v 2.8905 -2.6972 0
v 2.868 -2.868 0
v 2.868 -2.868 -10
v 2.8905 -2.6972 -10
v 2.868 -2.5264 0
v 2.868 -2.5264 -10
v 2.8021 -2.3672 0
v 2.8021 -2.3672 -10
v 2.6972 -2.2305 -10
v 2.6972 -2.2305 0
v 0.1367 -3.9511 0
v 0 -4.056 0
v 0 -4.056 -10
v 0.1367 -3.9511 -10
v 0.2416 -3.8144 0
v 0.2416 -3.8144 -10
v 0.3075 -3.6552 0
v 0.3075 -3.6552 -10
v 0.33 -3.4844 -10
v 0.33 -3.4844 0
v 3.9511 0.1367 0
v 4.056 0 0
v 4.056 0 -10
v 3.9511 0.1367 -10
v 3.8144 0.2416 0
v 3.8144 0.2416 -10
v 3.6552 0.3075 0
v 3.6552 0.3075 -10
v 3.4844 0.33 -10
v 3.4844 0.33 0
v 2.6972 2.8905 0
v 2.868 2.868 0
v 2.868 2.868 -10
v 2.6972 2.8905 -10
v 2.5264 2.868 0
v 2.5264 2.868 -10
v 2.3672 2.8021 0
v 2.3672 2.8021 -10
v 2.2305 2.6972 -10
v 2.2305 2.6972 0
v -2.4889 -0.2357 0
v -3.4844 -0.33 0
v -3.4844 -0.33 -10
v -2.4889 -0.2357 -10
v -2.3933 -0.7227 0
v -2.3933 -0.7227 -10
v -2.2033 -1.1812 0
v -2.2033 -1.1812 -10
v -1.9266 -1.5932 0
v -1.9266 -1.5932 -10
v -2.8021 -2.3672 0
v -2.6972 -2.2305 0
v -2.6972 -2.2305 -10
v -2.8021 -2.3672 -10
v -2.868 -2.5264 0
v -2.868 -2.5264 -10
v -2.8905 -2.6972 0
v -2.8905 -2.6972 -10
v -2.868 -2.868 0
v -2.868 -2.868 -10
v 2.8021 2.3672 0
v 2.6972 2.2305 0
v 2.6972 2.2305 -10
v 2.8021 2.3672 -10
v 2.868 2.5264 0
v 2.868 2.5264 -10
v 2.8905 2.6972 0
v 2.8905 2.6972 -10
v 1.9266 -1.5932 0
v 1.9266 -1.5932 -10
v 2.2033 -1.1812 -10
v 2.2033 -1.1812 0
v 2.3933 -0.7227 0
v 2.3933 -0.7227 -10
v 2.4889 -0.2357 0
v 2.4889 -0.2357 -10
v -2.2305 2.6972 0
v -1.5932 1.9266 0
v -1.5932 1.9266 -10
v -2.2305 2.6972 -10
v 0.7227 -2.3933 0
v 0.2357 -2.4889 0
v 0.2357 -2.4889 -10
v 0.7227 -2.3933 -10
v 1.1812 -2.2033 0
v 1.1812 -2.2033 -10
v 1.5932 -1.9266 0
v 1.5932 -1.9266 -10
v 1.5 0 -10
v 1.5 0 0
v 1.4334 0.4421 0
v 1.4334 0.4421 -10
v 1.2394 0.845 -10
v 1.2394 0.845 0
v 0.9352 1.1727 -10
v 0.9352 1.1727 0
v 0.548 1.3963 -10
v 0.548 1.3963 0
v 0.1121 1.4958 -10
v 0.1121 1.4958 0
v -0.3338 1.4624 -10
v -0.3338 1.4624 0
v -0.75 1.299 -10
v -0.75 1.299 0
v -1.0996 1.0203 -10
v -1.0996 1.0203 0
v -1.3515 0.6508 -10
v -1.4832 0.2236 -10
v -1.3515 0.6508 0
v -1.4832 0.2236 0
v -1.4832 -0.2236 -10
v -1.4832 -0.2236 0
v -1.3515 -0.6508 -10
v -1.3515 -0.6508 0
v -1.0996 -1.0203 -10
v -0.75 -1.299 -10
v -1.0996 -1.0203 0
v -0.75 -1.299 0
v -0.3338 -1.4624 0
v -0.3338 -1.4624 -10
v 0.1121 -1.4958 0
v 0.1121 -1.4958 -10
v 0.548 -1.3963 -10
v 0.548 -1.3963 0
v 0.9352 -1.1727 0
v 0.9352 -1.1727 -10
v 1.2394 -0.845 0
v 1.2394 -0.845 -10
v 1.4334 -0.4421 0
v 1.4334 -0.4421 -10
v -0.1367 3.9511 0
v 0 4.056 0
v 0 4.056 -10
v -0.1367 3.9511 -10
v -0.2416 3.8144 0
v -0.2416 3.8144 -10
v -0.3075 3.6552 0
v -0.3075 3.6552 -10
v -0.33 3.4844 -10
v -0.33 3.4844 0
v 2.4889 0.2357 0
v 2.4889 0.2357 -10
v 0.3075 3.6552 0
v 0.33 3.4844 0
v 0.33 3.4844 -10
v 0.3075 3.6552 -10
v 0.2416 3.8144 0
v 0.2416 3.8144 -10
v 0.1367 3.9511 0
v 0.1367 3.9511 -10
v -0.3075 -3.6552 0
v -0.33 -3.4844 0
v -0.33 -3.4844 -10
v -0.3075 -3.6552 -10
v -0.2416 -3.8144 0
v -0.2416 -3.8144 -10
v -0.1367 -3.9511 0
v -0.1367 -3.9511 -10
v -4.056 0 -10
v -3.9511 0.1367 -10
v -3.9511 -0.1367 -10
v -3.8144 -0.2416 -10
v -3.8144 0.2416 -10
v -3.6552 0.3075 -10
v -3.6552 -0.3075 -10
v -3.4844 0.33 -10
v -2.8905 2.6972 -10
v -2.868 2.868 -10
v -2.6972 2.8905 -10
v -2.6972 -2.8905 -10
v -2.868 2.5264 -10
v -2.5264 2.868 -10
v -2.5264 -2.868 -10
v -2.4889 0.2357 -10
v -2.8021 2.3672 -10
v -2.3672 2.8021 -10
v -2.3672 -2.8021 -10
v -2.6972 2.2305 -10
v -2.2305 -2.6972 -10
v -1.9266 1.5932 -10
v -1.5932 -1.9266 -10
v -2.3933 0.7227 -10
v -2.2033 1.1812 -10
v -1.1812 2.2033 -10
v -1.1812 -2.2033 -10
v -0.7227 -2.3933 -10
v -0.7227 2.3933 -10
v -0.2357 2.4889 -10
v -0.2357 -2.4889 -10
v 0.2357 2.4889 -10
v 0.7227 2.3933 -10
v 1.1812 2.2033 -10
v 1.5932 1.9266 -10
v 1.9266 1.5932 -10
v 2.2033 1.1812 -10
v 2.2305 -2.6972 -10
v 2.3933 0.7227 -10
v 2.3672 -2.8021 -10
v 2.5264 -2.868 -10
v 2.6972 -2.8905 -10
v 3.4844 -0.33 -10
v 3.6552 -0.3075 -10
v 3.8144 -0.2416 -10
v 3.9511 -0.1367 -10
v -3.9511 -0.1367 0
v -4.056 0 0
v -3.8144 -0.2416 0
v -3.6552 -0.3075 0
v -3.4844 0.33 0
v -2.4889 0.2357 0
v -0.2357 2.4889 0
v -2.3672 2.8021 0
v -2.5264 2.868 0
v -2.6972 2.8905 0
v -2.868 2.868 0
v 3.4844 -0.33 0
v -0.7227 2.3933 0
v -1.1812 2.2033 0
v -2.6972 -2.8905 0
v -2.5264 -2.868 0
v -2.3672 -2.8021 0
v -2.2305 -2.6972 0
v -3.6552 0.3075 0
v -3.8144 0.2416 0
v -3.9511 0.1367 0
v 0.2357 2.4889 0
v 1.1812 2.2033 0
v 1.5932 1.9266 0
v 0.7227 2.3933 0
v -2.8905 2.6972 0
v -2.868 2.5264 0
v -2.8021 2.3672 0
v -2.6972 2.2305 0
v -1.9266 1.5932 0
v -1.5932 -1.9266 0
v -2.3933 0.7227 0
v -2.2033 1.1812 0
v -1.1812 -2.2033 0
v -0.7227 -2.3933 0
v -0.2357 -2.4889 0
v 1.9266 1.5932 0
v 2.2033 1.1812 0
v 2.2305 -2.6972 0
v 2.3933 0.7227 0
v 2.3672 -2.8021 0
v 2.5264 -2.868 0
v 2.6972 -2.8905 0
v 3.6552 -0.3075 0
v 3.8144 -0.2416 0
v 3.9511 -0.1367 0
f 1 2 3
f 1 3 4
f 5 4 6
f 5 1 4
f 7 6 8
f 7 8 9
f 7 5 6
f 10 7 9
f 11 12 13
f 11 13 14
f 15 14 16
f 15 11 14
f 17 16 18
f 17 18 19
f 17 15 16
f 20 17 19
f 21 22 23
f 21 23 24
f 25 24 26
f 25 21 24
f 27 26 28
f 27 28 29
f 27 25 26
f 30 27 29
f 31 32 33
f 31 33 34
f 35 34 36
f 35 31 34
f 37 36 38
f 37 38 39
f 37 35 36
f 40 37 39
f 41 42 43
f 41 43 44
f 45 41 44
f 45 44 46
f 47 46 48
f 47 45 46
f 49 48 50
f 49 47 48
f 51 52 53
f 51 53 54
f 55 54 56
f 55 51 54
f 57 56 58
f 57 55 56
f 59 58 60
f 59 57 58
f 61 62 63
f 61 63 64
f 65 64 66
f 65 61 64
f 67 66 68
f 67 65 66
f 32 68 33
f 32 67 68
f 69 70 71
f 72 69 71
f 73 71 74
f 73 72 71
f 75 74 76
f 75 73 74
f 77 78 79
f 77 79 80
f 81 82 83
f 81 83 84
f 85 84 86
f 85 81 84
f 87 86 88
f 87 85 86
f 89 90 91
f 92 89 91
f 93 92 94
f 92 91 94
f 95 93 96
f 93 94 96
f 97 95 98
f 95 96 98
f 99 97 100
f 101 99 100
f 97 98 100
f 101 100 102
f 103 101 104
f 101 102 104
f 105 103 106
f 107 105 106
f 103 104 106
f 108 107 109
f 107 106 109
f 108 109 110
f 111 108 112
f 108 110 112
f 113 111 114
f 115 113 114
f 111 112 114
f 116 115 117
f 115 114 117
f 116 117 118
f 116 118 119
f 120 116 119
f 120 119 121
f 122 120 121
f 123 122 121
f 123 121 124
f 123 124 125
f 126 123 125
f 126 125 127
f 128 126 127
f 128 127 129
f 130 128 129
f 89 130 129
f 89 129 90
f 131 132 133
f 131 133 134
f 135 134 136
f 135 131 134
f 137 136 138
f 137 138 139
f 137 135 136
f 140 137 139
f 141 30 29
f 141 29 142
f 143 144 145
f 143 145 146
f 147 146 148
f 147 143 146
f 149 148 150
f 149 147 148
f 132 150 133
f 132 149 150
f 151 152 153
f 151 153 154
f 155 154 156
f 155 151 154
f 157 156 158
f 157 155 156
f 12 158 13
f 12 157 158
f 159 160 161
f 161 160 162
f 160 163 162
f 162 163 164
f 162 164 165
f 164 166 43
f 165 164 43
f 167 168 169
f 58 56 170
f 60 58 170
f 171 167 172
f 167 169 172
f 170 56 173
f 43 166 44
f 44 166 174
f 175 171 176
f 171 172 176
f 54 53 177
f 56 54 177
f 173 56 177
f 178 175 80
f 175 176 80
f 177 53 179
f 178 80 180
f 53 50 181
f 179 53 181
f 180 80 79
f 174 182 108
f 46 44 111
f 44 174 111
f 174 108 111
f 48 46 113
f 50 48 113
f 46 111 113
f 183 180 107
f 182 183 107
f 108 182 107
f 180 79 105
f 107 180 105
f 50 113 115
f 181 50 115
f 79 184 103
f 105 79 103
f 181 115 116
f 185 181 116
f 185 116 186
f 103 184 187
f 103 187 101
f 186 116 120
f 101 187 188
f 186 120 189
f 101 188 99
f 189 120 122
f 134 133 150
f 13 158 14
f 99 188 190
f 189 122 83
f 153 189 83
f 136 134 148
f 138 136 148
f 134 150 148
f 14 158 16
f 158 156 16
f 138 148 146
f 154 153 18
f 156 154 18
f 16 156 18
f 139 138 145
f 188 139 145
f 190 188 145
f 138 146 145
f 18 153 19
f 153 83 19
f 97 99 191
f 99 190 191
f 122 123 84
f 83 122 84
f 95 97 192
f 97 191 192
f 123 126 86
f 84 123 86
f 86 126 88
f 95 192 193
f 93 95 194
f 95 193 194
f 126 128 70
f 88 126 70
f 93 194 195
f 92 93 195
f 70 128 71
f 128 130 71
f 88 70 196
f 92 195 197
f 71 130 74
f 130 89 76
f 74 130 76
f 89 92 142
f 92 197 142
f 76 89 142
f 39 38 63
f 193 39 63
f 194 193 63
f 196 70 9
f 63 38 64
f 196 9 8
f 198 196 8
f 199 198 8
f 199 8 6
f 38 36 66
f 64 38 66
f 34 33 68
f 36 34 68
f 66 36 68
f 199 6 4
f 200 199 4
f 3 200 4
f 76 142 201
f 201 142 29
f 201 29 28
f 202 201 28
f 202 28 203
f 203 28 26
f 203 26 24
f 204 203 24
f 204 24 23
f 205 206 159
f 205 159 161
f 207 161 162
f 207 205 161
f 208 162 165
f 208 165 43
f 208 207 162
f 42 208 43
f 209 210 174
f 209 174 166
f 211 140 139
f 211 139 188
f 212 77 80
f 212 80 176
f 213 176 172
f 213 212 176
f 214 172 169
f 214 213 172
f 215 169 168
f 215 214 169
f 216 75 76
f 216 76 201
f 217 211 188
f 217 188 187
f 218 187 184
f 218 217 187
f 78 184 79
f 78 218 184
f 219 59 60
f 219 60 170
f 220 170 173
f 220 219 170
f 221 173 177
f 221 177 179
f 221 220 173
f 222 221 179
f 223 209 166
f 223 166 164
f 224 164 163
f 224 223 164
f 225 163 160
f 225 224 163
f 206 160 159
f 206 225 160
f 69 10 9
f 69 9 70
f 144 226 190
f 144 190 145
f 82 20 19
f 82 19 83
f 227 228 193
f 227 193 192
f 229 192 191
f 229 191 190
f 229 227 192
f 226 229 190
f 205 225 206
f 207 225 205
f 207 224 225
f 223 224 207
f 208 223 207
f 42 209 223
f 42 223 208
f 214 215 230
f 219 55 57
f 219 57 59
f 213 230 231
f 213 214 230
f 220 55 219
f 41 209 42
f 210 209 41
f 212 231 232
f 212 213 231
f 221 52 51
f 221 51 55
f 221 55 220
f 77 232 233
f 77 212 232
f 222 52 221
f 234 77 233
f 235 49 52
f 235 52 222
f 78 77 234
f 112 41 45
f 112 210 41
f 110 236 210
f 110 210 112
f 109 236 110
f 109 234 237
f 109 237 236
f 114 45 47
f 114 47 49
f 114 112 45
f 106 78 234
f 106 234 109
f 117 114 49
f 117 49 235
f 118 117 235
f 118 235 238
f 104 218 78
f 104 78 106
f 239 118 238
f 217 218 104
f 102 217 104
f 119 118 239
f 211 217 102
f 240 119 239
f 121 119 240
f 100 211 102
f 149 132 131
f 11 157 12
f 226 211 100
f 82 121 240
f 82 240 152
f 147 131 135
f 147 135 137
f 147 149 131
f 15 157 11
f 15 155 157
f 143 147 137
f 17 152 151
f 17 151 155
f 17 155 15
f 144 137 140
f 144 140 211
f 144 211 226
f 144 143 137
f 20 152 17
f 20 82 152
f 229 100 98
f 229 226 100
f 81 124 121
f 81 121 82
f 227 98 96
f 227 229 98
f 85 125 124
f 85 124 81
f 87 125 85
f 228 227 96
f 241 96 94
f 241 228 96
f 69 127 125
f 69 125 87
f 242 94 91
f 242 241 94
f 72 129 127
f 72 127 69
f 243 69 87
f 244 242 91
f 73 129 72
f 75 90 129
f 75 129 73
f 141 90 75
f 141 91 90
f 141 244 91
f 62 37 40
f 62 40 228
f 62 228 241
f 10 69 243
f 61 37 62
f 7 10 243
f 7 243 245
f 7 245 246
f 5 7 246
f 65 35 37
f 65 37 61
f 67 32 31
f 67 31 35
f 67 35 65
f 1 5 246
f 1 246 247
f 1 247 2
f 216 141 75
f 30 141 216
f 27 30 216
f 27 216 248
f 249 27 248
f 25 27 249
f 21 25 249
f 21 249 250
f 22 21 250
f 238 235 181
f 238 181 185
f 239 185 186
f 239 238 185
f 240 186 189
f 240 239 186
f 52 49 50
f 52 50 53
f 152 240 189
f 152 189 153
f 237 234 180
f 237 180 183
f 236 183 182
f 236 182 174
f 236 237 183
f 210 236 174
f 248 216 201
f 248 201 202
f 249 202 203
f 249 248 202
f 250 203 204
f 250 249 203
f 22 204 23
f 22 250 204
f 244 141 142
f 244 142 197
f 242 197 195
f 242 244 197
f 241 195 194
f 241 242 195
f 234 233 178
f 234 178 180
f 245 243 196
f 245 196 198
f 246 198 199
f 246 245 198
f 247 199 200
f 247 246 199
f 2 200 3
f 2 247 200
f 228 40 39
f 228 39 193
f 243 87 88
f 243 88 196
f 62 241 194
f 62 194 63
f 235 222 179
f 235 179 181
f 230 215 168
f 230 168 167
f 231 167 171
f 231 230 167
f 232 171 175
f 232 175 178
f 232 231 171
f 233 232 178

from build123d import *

# Parameters (mm, degrees)
SKETCH1_R           = 1.5
BOSS_EXTRUDE1_DEPTH = 10
CIRPATTERN1_COUNT   = 8


with BuildPart() as part:
    # Sketch1 → Boss-Extrude1 (new body)
    with BuildSketch(Plane.XY):
        with BuildLine():
            Line((-0.33, 3.484408128), (-0.235714286, 2.488862948))
            ThreePointArc((-0.235714286, 2.488862948), (0, -2.5), (0.235714286, 2.488862948))
            Line((0.235714286, 2.488862948), (0.33, 3.484408128))
            ThreePointArc((0.33, 3.484408128), (0.241576766, 3.814408128), (0, 4.055984894))
            ThreePointArc((0, 4.055984894), (-0.241576766, 3.814408128), (-0.33, 3.484408128))
        make_face()
        Circle(SKETCH1_R, mode=Mode.SUBTRACT)
    boss_extrude1 = extrude(amount=-BOSS_EXTRUDE1_DEPTH)

    # CirPattern1: Boss-Extrude1 ×8 about axis
    cirpattern1_axis = Axis((0, 0, 0), (0, 0, 1))
    for i in range(1, CIRPATTERN1_COUNT):
        add(boss_extrude1.rotate(cirpattern1_axis, i * 360 / CIRPATTERN1_COUNT))


solid = part.part
